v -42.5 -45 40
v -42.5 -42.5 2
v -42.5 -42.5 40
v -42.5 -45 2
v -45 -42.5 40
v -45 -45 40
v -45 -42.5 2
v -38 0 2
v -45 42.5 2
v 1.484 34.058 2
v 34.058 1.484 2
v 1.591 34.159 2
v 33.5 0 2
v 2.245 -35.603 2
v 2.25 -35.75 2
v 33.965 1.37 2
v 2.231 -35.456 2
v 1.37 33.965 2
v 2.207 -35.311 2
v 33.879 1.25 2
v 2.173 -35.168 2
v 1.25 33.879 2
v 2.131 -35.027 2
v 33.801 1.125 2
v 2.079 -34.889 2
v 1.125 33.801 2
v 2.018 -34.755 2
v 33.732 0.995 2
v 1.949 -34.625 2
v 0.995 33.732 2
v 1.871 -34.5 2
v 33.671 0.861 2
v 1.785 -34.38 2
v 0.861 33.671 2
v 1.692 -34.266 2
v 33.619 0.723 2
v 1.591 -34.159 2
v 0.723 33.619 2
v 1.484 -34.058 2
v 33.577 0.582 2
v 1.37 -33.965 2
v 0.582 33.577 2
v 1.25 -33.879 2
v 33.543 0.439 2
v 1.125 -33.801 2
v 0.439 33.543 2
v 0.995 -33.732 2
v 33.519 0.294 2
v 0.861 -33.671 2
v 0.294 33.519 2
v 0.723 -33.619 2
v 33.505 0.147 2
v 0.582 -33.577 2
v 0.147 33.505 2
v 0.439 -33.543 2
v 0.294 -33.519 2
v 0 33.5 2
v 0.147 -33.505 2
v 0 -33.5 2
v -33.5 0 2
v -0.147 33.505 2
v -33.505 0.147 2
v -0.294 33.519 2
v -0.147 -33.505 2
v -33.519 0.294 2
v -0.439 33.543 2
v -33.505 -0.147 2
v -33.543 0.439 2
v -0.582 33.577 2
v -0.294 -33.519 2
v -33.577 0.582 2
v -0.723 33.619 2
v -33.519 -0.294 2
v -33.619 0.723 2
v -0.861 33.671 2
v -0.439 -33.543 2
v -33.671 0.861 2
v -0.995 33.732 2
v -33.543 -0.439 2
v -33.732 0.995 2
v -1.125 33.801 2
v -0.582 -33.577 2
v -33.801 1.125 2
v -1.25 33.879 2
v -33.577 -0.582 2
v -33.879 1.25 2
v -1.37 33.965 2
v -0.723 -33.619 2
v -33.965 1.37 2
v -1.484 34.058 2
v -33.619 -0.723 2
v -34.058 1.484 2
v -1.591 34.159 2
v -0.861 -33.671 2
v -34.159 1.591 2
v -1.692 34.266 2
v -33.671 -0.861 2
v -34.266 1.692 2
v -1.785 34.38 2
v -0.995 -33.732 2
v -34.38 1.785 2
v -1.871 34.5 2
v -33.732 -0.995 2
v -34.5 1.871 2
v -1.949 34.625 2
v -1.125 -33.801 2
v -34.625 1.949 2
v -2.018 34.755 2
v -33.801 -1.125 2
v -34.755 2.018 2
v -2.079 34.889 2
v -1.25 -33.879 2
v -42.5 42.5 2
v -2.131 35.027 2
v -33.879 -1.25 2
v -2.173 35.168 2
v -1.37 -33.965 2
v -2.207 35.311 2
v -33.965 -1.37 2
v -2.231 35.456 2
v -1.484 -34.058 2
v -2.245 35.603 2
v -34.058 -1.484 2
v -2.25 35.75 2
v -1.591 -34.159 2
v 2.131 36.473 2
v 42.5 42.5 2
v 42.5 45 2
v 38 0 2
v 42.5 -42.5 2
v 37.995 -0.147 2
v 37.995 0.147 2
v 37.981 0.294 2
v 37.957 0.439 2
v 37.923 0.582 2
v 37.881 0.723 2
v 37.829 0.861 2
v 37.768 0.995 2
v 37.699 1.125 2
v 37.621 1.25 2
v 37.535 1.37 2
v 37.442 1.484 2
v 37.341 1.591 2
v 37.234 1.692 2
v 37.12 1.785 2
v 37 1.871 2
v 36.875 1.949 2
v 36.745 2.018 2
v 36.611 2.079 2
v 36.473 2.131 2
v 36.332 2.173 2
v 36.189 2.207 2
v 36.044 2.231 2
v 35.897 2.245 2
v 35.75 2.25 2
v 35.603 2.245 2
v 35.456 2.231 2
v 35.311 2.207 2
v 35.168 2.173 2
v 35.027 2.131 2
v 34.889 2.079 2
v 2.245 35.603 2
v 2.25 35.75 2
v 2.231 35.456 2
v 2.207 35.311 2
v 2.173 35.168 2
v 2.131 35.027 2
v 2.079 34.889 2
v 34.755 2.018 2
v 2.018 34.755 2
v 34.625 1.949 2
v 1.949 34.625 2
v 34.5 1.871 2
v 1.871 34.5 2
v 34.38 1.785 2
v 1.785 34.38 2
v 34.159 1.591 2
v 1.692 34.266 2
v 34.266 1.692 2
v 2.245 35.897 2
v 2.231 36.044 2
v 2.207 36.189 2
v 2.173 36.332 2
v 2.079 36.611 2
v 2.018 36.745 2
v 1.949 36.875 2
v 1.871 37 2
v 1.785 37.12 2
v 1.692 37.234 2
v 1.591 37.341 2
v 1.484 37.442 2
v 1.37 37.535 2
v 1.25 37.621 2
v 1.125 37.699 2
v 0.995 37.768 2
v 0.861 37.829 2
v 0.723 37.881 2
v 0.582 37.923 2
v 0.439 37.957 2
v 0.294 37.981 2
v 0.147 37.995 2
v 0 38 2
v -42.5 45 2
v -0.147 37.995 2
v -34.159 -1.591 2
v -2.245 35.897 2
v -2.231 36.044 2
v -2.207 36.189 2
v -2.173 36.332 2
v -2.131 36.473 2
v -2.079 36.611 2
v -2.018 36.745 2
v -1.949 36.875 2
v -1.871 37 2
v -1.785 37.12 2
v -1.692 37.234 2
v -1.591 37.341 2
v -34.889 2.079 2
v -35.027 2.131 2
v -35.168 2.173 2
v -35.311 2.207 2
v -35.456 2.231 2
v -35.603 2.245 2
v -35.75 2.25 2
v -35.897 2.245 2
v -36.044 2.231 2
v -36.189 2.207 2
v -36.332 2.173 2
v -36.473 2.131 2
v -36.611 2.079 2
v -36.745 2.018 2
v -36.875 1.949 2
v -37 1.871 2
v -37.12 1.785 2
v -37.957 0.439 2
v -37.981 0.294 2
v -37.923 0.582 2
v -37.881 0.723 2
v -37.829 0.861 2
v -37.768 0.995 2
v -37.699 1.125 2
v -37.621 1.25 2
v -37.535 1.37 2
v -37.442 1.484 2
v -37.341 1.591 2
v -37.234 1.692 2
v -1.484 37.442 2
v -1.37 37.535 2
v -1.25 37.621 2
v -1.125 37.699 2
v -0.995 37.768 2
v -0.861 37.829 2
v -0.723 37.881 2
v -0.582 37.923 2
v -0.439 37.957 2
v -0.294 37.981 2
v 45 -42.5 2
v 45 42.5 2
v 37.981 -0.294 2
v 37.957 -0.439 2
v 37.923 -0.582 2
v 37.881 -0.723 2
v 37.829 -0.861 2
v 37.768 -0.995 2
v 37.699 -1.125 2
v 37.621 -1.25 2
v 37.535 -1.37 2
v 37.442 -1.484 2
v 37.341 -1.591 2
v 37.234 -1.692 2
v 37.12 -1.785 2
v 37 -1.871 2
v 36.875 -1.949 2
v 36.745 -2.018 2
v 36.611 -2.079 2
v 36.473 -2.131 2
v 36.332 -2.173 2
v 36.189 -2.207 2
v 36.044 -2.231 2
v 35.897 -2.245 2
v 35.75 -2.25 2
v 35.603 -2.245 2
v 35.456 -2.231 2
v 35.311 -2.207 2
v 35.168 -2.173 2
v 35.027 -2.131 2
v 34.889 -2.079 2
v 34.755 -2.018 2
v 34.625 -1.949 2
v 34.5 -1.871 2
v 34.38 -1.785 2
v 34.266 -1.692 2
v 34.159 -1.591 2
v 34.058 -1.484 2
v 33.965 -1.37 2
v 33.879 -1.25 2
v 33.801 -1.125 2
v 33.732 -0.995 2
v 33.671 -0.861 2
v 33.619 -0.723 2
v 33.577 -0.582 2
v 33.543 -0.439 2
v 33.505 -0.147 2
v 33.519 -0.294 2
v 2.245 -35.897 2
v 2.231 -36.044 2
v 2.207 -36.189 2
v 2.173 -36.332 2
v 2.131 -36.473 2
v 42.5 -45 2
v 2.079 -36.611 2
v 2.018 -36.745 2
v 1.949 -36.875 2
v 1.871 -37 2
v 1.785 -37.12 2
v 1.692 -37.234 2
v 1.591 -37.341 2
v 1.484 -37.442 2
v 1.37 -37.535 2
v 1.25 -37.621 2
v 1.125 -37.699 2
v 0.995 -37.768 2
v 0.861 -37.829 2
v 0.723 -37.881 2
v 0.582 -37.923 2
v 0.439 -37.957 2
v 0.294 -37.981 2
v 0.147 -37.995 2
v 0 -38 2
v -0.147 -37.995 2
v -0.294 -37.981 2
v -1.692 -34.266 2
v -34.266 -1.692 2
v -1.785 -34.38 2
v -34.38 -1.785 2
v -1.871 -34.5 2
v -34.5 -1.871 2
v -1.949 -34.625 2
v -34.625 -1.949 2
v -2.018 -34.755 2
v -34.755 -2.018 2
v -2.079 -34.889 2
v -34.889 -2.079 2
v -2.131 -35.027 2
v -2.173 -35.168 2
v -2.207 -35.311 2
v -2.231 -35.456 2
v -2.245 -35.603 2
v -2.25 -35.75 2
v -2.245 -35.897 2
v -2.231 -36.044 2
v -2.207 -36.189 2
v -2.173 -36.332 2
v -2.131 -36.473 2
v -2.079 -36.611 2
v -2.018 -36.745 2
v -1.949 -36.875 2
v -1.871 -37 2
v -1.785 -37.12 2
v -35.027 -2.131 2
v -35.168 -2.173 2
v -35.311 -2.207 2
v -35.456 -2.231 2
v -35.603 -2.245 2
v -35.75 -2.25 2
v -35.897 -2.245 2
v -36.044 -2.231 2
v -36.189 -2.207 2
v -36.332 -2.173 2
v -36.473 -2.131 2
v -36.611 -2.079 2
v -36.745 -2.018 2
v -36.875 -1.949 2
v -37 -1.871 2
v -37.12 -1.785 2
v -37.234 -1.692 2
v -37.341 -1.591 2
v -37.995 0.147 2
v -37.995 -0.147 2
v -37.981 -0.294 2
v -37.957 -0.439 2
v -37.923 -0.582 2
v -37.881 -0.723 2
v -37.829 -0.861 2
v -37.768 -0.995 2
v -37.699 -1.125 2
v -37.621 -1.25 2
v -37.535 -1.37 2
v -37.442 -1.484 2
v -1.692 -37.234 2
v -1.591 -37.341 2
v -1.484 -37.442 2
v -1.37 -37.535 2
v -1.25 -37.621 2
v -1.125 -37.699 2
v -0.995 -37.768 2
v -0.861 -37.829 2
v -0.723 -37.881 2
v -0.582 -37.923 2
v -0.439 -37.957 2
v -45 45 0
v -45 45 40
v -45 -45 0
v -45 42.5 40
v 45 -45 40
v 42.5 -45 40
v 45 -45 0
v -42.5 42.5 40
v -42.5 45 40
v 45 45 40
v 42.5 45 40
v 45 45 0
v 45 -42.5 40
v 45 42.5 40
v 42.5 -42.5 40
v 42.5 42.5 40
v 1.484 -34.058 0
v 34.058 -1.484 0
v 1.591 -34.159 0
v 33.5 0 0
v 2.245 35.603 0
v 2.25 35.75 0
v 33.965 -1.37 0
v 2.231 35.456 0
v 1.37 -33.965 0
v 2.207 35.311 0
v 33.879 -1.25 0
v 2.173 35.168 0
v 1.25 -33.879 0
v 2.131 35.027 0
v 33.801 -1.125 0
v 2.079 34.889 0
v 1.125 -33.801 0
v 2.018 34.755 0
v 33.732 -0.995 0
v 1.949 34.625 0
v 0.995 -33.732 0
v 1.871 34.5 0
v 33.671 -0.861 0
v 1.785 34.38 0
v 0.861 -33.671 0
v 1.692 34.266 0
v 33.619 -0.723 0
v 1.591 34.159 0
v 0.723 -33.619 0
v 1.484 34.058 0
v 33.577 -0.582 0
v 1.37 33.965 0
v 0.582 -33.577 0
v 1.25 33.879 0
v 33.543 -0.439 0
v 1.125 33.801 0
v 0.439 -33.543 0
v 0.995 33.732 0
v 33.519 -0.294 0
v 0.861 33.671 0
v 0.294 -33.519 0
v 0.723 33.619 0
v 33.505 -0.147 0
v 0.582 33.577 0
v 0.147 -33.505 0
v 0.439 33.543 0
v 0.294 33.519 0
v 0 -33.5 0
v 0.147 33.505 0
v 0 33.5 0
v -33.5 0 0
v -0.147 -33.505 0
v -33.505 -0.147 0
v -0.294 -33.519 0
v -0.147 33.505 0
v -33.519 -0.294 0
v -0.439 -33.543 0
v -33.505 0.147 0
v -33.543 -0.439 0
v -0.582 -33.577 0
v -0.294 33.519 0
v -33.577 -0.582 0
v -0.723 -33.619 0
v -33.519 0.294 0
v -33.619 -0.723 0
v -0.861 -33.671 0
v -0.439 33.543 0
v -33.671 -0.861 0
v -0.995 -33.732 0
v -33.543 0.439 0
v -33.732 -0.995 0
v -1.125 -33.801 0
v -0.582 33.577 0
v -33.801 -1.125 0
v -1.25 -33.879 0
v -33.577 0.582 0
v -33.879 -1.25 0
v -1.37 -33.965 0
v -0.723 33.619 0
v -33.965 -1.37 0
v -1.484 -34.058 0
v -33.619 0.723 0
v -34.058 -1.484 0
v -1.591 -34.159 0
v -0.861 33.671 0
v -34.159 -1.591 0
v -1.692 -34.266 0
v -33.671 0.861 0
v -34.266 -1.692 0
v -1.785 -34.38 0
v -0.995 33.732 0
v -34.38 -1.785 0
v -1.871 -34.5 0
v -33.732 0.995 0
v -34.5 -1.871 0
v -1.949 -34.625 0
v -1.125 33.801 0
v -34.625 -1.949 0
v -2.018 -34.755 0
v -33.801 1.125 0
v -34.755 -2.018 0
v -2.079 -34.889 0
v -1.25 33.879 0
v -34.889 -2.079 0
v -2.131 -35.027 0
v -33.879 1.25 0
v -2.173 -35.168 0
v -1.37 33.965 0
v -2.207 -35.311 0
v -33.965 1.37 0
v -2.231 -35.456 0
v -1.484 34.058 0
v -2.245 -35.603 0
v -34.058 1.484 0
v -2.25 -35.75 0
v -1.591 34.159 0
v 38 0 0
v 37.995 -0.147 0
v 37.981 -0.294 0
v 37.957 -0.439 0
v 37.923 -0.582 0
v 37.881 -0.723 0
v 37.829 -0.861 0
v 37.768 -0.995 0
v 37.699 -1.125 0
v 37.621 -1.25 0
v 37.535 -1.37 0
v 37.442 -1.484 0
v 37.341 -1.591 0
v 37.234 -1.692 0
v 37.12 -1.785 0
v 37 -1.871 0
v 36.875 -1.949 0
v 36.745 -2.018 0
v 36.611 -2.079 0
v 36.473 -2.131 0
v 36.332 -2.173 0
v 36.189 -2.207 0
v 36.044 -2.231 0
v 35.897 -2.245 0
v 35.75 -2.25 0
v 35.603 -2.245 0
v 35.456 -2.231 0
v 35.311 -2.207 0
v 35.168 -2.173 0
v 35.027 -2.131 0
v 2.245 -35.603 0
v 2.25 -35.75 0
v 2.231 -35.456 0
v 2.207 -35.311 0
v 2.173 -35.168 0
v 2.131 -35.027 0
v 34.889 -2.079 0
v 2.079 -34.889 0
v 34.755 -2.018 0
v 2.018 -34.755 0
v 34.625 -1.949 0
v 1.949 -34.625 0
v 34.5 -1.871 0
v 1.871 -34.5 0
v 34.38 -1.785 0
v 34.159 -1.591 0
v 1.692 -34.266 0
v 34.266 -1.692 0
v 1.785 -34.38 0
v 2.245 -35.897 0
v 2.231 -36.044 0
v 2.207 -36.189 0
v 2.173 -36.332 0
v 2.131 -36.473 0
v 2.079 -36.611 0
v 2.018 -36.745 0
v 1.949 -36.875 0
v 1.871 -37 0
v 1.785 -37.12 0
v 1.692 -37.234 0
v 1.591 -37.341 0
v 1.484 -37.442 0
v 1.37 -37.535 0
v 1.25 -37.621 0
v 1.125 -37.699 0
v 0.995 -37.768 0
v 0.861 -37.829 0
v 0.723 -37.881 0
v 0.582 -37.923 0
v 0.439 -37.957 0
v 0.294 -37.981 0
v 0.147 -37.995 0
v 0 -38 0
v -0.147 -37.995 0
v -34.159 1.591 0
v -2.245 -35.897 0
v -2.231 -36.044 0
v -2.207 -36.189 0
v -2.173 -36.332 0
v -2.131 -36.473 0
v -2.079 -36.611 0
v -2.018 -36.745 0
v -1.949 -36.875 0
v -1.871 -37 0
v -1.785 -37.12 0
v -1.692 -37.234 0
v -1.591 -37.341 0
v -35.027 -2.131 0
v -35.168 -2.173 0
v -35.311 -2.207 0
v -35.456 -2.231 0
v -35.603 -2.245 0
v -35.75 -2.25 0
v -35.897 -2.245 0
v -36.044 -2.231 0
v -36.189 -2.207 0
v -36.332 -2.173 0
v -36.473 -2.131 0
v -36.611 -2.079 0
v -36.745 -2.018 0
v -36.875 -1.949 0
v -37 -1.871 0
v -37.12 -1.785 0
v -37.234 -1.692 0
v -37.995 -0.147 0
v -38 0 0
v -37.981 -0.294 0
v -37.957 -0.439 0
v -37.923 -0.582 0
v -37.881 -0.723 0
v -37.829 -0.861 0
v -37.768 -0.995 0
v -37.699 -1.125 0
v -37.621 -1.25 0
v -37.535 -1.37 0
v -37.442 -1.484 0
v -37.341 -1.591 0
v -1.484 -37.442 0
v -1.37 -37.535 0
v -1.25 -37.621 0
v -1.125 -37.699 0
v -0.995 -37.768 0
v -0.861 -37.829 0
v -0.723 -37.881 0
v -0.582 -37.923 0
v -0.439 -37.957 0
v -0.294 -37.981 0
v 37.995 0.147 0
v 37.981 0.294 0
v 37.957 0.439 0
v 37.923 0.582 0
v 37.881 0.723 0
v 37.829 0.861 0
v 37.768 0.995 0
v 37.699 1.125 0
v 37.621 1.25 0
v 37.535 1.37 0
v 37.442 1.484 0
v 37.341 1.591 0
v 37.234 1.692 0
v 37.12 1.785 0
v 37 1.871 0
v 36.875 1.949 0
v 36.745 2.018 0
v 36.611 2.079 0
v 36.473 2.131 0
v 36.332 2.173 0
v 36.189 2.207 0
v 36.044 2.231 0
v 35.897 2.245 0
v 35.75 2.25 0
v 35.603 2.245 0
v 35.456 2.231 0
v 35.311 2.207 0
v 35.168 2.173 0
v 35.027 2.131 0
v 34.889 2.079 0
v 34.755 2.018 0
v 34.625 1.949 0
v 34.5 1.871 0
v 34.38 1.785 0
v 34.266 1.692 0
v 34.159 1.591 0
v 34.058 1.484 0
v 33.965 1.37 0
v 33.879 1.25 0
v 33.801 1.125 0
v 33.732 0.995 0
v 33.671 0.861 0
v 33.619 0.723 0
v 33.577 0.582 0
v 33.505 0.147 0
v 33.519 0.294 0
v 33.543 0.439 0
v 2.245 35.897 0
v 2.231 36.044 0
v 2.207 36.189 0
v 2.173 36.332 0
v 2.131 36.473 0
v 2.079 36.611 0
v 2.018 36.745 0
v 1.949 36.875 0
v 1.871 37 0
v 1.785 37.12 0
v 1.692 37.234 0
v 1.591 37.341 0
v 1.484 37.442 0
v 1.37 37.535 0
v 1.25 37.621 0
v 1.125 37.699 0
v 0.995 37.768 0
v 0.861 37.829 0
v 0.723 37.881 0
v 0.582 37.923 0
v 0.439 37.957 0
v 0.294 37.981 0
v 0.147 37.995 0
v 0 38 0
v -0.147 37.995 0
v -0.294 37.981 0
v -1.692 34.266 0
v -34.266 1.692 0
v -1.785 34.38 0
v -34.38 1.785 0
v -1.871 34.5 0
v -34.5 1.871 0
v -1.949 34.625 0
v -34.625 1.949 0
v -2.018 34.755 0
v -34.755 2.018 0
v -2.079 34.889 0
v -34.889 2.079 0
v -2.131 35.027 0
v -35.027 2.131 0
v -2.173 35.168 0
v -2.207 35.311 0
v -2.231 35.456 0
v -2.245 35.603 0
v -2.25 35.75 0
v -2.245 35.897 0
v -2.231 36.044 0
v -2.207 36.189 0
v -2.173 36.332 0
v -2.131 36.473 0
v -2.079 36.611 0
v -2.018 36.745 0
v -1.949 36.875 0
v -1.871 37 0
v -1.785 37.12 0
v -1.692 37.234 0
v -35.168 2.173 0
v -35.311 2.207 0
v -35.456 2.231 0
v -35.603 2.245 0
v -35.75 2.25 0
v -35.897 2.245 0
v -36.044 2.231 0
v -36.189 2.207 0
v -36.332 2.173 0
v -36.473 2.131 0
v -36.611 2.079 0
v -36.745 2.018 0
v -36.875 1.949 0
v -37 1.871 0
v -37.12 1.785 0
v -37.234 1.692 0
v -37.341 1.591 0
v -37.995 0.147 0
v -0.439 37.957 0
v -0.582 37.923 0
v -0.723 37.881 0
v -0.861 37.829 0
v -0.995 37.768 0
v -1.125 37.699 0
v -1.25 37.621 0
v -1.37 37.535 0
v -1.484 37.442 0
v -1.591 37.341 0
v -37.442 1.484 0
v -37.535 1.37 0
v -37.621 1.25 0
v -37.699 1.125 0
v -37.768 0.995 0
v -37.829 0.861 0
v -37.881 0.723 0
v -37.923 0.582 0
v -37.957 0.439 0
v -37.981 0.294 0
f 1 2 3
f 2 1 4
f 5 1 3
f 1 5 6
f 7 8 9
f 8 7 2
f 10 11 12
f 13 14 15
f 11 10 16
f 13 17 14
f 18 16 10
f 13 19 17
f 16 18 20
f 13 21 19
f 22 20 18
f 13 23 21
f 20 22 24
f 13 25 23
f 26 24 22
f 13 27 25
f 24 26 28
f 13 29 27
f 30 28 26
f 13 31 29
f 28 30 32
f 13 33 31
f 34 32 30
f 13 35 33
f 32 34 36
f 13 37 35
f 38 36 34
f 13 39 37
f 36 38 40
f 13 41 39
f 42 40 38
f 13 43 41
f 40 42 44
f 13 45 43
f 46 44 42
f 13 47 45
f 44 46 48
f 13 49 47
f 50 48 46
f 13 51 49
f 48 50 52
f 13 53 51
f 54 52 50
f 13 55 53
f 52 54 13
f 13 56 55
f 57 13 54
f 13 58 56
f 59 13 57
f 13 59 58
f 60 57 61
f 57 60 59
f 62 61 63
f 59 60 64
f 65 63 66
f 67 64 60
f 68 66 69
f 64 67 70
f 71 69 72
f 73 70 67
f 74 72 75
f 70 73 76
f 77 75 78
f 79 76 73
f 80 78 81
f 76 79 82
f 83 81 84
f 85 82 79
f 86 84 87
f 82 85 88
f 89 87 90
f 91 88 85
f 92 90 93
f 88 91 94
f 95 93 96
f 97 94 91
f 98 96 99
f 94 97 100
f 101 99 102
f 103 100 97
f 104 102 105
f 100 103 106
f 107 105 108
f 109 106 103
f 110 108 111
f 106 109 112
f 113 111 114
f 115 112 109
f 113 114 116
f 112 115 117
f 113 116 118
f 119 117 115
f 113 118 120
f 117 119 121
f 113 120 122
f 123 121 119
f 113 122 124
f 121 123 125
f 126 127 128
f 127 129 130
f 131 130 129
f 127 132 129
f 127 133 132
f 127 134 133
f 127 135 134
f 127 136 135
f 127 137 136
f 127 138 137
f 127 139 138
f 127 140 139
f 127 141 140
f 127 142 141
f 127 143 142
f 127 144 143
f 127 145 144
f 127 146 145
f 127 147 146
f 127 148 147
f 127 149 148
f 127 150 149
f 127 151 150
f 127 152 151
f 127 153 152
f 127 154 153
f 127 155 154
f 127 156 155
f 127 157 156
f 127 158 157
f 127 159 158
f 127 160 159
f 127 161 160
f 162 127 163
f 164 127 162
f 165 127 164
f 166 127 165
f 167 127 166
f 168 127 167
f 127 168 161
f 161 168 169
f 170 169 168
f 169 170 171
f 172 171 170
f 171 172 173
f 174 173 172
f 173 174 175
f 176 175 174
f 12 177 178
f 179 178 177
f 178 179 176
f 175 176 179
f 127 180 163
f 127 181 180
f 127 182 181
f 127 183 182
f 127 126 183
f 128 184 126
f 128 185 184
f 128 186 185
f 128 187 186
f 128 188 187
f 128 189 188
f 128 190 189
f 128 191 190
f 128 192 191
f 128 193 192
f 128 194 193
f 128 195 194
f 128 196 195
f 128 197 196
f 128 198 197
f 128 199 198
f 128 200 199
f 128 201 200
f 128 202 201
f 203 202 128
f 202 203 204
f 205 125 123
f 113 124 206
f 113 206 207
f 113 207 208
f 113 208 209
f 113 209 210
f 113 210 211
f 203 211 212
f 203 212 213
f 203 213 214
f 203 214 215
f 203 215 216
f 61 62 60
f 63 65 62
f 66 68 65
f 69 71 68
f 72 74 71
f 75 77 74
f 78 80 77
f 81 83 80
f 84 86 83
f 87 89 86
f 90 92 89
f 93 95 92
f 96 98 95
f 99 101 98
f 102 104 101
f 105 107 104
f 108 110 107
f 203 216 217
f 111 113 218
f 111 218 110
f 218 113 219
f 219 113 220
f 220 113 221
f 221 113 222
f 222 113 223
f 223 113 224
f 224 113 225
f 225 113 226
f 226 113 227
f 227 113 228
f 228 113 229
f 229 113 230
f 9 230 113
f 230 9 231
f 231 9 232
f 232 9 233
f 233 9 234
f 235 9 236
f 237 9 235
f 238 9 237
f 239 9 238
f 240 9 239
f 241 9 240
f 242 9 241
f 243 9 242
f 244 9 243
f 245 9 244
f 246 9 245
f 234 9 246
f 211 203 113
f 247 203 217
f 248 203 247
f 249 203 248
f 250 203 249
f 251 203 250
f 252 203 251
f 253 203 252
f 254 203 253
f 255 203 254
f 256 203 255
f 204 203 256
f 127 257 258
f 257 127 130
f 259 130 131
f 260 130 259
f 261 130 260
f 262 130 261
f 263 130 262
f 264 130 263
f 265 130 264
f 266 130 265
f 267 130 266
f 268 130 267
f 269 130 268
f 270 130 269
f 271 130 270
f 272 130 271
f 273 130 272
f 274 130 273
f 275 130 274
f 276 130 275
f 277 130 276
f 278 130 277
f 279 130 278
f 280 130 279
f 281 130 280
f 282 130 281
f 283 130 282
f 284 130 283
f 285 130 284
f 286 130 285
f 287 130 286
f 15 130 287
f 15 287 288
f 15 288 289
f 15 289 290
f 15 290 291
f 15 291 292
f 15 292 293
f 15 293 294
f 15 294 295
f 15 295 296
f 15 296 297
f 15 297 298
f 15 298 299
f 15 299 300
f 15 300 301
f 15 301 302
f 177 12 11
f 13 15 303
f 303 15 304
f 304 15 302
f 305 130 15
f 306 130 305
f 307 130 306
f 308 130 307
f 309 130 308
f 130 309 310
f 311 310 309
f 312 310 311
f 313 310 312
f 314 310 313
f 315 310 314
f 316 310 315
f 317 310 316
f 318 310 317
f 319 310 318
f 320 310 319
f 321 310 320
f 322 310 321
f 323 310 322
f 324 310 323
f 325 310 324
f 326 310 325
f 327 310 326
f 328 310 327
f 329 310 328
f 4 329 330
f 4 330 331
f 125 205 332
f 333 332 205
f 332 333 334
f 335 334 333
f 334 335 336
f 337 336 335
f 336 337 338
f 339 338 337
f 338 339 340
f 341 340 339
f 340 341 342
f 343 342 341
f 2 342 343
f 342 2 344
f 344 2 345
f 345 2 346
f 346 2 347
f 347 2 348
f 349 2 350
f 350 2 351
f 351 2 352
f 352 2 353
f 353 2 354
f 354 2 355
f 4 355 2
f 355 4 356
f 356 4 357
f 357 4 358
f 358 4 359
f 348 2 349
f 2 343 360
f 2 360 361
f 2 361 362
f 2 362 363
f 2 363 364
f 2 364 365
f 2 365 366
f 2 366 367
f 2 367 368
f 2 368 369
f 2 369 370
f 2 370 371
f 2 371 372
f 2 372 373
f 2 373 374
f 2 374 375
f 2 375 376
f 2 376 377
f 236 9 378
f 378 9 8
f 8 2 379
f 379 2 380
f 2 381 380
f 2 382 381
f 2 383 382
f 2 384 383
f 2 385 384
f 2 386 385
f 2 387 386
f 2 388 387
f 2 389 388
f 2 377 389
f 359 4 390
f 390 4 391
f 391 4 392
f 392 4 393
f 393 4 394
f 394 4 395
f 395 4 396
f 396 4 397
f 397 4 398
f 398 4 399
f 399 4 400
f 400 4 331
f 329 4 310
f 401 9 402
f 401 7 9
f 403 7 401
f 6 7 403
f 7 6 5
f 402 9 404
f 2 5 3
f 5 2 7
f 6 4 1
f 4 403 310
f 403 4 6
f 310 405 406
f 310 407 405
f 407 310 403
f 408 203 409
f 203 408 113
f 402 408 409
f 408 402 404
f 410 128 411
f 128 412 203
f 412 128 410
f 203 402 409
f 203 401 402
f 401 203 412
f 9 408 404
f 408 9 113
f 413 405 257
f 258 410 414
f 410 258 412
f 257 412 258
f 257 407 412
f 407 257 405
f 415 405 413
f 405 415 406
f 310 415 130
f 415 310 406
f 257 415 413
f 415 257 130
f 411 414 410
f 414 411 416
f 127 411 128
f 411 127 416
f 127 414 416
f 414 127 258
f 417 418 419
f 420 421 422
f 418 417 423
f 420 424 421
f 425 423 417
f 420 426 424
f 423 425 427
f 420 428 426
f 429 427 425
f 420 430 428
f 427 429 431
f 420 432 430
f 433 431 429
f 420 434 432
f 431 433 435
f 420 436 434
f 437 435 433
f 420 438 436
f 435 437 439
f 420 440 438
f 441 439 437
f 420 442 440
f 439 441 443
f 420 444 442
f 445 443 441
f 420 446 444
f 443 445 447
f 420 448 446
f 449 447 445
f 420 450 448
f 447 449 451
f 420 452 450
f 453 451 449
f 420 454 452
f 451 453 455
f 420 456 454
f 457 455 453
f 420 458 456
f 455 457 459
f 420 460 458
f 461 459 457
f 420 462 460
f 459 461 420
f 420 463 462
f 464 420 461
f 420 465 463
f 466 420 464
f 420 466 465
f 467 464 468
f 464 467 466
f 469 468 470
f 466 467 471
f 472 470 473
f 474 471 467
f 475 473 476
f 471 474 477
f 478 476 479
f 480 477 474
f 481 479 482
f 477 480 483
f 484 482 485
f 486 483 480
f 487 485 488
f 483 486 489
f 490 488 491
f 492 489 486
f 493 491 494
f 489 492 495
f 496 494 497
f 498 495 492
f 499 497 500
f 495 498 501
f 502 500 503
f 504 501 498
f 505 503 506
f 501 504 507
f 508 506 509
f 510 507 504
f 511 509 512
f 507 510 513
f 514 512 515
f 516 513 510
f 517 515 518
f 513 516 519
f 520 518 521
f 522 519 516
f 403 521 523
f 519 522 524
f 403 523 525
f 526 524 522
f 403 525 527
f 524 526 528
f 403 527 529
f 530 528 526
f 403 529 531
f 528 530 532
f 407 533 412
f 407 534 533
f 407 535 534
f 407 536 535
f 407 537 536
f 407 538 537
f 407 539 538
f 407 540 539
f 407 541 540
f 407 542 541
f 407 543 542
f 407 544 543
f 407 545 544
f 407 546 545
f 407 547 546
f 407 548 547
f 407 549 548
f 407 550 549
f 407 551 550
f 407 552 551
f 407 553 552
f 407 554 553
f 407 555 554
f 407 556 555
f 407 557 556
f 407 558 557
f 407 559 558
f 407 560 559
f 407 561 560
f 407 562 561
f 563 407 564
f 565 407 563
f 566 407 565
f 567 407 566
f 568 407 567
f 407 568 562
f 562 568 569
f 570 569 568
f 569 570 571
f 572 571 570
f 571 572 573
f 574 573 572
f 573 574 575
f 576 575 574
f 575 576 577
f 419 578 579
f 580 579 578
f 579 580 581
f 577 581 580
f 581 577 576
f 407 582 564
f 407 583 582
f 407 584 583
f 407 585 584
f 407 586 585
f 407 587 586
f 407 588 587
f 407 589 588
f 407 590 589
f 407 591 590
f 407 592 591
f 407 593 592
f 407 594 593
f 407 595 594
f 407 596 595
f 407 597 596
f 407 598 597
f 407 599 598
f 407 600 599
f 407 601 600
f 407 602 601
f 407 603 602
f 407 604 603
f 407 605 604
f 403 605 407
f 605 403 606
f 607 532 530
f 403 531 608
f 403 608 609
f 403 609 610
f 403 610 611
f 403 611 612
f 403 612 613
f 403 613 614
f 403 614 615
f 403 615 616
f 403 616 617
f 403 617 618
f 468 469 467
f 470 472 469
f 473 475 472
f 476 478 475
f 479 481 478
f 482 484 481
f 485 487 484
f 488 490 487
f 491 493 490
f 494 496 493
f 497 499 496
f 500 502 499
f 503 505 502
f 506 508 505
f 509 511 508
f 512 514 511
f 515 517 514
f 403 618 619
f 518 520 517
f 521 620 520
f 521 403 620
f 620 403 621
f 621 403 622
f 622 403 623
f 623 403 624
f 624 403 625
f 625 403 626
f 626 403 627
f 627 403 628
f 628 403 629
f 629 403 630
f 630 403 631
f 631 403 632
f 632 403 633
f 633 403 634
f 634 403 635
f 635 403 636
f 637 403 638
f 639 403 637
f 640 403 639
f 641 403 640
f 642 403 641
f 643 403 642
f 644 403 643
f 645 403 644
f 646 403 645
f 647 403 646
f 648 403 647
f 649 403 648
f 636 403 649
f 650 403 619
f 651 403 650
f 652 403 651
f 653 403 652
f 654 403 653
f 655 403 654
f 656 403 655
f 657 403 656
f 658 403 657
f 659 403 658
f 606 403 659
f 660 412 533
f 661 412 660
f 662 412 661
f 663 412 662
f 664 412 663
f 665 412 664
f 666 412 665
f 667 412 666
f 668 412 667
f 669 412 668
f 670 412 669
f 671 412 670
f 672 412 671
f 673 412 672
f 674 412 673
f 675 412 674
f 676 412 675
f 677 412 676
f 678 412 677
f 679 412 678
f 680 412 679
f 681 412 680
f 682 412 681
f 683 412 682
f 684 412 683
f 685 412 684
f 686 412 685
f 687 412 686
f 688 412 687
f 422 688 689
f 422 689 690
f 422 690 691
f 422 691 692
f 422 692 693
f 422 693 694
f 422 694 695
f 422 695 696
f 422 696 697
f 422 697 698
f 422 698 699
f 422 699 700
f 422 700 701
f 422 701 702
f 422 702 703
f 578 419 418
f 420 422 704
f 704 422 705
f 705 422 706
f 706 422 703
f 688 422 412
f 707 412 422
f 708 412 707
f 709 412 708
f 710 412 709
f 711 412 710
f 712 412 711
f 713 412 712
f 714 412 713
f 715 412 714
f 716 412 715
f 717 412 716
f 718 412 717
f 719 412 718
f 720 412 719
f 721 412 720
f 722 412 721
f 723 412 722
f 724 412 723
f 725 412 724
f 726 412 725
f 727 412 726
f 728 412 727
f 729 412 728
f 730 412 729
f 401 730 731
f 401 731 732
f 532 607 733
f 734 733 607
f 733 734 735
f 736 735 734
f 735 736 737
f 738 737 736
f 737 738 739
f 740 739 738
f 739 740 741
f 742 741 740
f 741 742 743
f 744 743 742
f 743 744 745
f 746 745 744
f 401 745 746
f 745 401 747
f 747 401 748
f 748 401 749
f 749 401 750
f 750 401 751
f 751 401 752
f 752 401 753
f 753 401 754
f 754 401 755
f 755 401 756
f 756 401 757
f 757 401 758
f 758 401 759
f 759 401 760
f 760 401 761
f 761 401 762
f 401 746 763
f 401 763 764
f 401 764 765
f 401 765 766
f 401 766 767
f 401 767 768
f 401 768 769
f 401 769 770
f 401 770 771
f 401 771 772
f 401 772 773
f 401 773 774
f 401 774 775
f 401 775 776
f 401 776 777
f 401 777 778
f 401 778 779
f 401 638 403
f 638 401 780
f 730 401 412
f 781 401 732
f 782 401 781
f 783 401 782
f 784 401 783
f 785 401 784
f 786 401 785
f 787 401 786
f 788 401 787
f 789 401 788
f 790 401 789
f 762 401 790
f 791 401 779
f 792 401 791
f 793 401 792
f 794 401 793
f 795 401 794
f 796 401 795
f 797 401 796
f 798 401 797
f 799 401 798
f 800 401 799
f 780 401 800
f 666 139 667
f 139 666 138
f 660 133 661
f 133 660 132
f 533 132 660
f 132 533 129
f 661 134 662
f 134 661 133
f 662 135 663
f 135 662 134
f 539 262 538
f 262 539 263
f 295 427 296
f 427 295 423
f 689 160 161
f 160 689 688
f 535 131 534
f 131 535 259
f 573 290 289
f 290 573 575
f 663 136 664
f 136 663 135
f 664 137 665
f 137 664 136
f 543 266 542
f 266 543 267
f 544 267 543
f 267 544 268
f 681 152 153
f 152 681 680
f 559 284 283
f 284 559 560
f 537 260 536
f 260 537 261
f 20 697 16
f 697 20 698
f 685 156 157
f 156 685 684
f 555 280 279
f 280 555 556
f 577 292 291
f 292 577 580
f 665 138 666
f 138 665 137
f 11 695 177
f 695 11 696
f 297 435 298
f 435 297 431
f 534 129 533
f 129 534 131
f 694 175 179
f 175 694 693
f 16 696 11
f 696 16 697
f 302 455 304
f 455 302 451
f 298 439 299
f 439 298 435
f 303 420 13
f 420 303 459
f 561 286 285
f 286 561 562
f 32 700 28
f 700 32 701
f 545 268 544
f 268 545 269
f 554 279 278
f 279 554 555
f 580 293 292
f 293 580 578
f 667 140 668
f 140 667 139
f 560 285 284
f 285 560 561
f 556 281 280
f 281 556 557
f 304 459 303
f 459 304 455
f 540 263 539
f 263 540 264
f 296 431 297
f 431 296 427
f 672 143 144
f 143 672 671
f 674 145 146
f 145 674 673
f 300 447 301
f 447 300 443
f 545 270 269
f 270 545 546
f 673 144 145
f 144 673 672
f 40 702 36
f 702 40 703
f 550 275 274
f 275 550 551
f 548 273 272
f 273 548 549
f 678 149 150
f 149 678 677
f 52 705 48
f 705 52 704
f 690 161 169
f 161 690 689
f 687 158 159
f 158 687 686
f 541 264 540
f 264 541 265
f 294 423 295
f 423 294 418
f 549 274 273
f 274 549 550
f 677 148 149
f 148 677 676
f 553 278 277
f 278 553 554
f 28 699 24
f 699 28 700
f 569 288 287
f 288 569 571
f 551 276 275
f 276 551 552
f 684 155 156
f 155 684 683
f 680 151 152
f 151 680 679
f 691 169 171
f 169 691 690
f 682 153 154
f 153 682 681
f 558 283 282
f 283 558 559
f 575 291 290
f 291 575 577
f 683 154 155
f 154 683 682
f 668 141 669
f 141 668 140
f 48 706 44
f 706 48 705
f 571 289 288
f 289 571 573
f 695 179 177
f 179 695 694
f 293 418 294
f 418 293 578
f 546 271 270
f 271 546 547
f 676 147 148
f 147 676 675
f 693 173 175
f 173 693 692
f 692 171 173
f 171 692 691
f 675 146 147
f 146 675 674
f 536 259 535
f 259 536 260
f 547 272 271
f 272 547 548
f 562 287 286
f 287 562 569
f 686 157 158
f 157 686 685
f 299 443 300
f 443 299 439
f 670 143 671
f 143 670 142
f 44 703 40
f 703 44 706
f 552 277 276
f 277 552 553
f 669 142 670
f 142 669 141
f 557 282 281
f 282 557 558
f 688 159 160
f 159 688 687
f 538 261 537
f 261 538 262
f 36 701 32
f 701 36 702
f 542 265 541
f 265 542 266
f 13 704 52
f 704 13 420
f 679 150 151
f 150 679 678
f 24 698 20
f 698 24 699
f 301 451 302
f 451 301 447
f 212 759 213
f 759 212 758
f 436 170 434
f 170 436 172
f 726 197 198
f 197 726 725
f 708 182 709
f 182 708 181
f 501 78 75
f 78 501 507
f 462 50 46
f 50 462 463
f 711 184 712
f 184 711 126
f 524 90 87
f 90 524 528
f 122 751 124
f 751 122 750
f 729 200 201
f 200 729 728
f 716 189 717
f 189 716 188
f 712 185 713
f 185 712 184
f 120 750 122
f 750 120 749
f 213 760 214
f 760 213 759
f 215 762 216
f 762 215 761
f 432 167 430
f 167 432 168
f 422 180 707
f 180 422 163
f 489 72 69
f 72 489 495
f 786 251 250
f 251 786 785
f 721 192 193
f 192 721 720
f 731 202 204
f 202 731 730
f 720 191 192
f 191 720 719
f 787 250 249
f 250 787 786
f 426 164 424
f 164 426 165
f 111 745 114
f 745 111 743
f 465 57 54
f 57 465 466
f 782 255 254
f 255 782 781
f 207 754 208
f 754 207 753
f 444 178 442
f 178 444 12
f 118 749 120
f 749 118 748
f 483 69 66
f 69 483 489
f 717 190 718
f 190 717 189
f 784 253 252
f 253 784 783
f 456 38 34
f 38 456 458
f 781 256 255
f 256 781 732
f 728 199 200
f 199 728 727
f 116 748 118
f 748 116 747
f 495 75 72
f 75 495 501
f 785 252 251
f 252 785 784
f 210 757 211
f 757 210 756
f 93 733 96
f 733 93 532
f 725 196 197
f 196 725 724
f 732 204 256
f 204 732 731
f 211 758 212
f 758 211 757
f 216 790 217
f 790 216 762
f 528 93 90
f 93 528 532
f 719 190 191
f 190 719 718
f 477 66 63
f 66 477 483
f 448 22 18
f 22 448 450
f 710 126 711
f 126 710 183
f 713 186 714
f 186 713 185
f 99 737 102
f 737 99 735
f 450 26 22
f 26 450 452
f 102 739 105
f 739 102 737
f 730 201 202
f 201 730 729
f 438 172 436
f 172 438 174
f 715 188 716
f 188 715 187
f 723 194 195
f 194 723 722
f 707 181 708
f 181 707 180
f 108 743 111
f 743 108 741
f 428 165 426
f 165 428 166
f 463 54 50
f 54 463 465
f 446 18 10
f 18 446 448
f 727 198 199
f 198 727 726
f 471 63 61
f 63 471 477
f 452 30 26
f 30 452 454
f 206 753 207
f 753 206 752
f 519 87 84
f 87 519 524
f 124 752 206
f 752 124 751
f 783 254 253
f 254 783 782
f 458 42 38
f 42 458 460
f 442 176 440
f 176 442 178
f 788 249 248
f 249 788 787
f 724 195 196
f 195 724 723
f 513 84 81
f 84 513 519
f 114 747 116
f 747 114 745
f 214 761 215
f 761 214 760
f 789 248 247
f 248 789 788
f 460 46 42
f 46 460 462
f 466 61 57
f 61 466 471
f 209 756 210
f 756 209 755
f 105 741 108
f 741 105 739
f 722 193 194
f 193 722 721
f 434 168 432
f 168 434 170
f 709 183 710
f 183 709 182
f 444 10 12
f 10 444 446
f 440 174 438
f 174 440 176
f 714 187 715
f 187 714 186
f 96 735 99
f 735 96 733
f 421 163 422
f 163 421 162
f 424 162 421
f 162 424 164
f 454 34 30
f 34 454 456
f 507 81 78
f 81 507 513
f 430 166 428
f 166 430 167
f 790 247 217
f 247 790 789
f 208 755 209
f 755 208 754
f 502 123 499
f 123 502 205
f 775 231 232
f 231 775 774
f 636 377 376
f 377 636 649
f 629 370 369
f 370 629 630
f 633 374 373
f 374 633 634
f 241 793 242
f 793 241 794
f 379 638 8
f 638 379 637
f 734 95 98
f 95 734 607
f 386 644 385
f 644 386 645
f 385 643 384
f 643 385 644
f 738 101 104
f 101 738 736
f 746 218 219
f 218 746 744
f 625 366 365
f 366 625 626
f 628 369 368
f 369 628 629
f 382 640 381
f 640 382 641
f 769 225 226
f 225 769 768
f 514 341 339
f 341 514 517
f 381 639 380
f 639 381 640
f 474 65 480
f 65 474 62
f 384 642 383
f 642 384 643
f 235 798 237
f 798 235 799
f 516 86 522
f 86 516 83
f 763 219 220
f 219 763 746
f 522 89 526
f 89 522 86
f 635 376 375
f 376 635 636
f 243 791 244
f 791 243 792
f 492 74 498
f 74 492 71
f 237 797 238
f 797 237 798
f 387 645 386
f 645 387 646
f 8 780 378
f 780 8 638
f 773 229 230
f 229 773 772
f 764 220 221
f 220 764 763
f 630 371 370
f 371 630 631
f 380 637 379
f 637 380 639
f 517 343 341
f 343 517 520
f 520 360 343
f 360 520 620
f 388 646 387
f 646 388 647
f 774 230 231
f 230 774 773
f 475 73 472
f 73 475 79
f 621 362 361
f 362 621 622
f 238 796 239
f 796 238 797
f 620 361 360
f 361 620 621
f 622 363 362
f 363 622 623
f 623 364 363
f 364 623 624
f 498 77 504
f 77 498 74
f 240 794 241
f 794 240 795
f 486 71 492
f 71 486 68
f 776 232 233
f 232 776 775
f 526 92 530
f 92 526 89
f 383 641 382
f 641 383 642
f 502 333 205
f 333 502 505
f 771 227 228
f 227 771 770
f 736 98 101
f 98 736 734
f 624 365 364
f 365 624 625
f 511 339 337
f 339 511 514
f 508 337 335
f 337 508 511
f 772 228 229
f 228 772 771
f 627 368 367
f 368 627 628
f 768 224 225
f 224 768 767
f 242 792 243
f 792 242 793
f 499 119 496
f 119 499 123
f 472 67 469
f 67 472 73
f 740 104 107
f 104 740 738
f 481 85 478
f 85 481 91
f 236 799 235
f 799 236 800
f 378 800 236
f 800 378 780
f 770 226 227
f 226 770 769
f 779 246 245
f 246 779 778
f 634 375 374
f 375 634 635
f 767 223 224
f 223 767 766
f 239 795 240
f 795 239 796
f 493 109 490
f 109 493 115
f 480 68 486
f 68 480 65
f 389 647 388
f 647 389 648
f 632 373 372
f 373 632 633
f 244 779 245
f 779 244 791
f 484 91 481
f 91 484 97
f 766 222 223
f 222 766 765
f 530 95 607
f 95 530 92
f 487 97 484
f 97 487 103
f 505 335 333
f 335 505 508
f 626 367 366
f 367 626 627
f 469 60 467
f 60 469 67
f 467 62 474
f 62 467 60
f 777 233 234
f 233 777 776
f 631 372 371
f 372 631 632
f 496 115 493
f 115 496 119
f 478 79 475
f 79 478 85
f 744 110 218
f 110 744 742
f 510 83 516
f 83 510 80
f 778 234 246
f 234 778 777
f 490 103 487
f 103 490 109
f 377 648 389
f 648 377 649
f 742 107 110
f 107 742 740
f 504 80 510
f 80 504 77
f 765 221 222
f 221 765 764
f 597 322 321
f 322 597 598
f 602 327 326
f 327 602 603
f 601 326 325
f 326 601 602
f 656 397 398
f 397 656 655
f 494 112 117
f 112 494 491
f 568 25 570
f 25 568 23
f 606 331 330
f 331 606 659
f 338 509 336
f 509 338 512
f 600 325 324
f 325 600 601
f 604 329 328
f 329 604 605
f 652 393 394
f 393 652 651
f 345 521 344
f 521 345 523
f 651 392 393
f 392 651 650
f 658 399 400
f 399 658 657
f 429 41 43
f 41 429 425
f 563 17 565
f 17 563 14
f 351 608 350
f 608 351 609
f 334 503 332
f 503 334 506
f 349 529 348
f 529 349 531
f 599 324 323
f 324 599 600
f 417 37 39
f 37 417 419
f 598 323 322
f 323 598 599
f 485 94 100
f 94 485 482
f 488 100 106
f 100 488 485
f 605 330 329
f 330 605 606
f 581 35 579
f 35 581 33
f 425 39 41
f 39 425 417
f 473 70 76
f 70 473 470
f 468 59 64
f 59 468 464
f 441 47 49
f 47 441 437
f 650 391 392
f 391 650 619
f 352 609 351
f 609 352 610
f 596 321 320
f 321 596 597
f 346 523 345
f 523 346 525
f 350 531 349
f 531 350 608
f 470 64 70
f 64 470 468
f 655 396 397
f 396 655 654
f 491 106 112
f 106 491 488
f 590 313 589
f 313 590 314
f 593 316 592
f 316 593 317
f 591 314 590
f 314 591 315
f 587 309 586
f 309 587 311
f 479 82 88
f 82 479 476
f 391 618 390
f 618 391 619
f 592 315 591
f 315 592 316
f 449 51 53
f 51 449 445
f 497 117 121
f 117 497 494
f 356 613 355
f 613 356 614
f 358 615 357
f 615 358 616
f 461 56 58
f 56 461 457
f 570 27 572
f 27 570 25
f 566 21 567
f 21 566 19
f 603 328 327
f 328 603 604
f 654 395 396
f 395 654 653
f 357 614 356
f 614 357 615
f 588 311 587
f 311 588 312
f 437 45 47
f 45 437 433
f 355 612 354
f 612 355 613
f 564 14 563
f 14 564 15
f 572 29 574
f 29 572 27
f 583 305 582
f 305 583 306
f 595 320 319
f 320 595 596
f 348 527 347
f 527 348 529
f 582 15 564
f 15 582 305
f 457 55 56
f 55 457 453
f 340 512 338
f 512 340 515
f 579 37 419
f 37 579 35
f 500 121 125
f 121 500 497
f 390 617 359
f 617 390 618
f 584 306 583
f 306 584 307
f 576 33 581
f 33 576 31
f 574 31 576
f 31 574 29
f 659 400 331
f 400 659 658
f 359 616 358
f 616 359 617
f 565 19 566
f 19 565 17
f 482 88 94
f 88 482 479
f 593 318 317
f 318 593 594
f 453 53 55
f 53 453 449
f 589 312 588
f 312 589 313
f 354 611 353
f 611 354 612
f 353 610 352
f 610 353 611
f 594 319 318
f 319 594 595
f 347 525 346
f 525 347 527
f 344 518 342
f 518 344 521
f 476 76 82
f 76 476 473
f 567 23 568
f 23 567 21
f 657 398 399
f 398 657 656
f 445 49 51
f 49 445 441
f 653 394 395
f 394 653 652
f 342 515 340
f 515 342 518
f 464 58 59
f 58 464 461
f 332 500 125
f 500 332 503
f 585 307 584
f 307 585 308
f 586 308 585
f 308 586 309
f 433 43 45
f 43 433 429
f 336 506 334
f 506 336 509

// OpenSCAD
// DIY magnetic stirrer housing for 80 mm PC case fan
// Print orientation: upside-down open box, top plate on bed (z = 0 to 2)

// ---------- Parameters ----------
top_thickness      = 2;     // top plate thickness
wall_thickness     = 2.5;   // wall thickness
box_height         = 40;    // total height of walls (z = 0 to 40)
outer_size         = 90;    // outer X and Y size of box
screw_hole_count   = 4;     // number of M4 screw holes
screw_hole_d       = 4.5;   // screw hole diameter
screw_hole_pitch   = 71.5;  // square pitch between screw holes
cable_notch_w      = 12;    // cable notch width
cable_notch_depth  = 8;     // cable notch depth from open edge
eps                = 0.5;   // overcut for clean differences
$fn                = 96;    // curve resolution

// ---------- Model ----------
difference() {
    union() {
        // Top plate
        translate([-outer_size/2, -outer_size/2, 0])
            cube([outer_size, outer_size, top_thickness]);

        // Four walls rising from top plate to open top (z = box_height)
        for (sx = [-1, 1], sy = [-1, 1])
            translate([sx > 0 ? outer_size/2 - wall_thickness : -outer_size/2,
                       sy > 0 ? outer_size/2 - wall_thickness : -outer_size/2,
                       top_thickness])
                cube([wall_thickness, wall_thickness, box_height - top_thickness]);
    }

    // Screw holes through top plate on centred square pattern
    for (i = [0 : screw_hole_count - 1]) {
        angle = i * 90;
        translate([0, 0, -eps])
            rotate([0, 0, angle])
                translate([screw_hole_pitch/2, 0, 0])
                    cylinder(d = screw_hole_d, h = top_thickness + 2*eps);
    }

    // Cable notch in one wall: centred along wall, 12 mm wide,
    // reaching 8 mm down from open edge (z = 32 to z = 40)
    translate([outer_size/2 - wall_thickness - eps,
               -outer_size/2 + cable_notch_w/2,
               box_height - top_thickness - cable_notch_depth])
        cube([wall_thickness + 2*eps, cable_notch_w, cable_notch_depth]);
}
